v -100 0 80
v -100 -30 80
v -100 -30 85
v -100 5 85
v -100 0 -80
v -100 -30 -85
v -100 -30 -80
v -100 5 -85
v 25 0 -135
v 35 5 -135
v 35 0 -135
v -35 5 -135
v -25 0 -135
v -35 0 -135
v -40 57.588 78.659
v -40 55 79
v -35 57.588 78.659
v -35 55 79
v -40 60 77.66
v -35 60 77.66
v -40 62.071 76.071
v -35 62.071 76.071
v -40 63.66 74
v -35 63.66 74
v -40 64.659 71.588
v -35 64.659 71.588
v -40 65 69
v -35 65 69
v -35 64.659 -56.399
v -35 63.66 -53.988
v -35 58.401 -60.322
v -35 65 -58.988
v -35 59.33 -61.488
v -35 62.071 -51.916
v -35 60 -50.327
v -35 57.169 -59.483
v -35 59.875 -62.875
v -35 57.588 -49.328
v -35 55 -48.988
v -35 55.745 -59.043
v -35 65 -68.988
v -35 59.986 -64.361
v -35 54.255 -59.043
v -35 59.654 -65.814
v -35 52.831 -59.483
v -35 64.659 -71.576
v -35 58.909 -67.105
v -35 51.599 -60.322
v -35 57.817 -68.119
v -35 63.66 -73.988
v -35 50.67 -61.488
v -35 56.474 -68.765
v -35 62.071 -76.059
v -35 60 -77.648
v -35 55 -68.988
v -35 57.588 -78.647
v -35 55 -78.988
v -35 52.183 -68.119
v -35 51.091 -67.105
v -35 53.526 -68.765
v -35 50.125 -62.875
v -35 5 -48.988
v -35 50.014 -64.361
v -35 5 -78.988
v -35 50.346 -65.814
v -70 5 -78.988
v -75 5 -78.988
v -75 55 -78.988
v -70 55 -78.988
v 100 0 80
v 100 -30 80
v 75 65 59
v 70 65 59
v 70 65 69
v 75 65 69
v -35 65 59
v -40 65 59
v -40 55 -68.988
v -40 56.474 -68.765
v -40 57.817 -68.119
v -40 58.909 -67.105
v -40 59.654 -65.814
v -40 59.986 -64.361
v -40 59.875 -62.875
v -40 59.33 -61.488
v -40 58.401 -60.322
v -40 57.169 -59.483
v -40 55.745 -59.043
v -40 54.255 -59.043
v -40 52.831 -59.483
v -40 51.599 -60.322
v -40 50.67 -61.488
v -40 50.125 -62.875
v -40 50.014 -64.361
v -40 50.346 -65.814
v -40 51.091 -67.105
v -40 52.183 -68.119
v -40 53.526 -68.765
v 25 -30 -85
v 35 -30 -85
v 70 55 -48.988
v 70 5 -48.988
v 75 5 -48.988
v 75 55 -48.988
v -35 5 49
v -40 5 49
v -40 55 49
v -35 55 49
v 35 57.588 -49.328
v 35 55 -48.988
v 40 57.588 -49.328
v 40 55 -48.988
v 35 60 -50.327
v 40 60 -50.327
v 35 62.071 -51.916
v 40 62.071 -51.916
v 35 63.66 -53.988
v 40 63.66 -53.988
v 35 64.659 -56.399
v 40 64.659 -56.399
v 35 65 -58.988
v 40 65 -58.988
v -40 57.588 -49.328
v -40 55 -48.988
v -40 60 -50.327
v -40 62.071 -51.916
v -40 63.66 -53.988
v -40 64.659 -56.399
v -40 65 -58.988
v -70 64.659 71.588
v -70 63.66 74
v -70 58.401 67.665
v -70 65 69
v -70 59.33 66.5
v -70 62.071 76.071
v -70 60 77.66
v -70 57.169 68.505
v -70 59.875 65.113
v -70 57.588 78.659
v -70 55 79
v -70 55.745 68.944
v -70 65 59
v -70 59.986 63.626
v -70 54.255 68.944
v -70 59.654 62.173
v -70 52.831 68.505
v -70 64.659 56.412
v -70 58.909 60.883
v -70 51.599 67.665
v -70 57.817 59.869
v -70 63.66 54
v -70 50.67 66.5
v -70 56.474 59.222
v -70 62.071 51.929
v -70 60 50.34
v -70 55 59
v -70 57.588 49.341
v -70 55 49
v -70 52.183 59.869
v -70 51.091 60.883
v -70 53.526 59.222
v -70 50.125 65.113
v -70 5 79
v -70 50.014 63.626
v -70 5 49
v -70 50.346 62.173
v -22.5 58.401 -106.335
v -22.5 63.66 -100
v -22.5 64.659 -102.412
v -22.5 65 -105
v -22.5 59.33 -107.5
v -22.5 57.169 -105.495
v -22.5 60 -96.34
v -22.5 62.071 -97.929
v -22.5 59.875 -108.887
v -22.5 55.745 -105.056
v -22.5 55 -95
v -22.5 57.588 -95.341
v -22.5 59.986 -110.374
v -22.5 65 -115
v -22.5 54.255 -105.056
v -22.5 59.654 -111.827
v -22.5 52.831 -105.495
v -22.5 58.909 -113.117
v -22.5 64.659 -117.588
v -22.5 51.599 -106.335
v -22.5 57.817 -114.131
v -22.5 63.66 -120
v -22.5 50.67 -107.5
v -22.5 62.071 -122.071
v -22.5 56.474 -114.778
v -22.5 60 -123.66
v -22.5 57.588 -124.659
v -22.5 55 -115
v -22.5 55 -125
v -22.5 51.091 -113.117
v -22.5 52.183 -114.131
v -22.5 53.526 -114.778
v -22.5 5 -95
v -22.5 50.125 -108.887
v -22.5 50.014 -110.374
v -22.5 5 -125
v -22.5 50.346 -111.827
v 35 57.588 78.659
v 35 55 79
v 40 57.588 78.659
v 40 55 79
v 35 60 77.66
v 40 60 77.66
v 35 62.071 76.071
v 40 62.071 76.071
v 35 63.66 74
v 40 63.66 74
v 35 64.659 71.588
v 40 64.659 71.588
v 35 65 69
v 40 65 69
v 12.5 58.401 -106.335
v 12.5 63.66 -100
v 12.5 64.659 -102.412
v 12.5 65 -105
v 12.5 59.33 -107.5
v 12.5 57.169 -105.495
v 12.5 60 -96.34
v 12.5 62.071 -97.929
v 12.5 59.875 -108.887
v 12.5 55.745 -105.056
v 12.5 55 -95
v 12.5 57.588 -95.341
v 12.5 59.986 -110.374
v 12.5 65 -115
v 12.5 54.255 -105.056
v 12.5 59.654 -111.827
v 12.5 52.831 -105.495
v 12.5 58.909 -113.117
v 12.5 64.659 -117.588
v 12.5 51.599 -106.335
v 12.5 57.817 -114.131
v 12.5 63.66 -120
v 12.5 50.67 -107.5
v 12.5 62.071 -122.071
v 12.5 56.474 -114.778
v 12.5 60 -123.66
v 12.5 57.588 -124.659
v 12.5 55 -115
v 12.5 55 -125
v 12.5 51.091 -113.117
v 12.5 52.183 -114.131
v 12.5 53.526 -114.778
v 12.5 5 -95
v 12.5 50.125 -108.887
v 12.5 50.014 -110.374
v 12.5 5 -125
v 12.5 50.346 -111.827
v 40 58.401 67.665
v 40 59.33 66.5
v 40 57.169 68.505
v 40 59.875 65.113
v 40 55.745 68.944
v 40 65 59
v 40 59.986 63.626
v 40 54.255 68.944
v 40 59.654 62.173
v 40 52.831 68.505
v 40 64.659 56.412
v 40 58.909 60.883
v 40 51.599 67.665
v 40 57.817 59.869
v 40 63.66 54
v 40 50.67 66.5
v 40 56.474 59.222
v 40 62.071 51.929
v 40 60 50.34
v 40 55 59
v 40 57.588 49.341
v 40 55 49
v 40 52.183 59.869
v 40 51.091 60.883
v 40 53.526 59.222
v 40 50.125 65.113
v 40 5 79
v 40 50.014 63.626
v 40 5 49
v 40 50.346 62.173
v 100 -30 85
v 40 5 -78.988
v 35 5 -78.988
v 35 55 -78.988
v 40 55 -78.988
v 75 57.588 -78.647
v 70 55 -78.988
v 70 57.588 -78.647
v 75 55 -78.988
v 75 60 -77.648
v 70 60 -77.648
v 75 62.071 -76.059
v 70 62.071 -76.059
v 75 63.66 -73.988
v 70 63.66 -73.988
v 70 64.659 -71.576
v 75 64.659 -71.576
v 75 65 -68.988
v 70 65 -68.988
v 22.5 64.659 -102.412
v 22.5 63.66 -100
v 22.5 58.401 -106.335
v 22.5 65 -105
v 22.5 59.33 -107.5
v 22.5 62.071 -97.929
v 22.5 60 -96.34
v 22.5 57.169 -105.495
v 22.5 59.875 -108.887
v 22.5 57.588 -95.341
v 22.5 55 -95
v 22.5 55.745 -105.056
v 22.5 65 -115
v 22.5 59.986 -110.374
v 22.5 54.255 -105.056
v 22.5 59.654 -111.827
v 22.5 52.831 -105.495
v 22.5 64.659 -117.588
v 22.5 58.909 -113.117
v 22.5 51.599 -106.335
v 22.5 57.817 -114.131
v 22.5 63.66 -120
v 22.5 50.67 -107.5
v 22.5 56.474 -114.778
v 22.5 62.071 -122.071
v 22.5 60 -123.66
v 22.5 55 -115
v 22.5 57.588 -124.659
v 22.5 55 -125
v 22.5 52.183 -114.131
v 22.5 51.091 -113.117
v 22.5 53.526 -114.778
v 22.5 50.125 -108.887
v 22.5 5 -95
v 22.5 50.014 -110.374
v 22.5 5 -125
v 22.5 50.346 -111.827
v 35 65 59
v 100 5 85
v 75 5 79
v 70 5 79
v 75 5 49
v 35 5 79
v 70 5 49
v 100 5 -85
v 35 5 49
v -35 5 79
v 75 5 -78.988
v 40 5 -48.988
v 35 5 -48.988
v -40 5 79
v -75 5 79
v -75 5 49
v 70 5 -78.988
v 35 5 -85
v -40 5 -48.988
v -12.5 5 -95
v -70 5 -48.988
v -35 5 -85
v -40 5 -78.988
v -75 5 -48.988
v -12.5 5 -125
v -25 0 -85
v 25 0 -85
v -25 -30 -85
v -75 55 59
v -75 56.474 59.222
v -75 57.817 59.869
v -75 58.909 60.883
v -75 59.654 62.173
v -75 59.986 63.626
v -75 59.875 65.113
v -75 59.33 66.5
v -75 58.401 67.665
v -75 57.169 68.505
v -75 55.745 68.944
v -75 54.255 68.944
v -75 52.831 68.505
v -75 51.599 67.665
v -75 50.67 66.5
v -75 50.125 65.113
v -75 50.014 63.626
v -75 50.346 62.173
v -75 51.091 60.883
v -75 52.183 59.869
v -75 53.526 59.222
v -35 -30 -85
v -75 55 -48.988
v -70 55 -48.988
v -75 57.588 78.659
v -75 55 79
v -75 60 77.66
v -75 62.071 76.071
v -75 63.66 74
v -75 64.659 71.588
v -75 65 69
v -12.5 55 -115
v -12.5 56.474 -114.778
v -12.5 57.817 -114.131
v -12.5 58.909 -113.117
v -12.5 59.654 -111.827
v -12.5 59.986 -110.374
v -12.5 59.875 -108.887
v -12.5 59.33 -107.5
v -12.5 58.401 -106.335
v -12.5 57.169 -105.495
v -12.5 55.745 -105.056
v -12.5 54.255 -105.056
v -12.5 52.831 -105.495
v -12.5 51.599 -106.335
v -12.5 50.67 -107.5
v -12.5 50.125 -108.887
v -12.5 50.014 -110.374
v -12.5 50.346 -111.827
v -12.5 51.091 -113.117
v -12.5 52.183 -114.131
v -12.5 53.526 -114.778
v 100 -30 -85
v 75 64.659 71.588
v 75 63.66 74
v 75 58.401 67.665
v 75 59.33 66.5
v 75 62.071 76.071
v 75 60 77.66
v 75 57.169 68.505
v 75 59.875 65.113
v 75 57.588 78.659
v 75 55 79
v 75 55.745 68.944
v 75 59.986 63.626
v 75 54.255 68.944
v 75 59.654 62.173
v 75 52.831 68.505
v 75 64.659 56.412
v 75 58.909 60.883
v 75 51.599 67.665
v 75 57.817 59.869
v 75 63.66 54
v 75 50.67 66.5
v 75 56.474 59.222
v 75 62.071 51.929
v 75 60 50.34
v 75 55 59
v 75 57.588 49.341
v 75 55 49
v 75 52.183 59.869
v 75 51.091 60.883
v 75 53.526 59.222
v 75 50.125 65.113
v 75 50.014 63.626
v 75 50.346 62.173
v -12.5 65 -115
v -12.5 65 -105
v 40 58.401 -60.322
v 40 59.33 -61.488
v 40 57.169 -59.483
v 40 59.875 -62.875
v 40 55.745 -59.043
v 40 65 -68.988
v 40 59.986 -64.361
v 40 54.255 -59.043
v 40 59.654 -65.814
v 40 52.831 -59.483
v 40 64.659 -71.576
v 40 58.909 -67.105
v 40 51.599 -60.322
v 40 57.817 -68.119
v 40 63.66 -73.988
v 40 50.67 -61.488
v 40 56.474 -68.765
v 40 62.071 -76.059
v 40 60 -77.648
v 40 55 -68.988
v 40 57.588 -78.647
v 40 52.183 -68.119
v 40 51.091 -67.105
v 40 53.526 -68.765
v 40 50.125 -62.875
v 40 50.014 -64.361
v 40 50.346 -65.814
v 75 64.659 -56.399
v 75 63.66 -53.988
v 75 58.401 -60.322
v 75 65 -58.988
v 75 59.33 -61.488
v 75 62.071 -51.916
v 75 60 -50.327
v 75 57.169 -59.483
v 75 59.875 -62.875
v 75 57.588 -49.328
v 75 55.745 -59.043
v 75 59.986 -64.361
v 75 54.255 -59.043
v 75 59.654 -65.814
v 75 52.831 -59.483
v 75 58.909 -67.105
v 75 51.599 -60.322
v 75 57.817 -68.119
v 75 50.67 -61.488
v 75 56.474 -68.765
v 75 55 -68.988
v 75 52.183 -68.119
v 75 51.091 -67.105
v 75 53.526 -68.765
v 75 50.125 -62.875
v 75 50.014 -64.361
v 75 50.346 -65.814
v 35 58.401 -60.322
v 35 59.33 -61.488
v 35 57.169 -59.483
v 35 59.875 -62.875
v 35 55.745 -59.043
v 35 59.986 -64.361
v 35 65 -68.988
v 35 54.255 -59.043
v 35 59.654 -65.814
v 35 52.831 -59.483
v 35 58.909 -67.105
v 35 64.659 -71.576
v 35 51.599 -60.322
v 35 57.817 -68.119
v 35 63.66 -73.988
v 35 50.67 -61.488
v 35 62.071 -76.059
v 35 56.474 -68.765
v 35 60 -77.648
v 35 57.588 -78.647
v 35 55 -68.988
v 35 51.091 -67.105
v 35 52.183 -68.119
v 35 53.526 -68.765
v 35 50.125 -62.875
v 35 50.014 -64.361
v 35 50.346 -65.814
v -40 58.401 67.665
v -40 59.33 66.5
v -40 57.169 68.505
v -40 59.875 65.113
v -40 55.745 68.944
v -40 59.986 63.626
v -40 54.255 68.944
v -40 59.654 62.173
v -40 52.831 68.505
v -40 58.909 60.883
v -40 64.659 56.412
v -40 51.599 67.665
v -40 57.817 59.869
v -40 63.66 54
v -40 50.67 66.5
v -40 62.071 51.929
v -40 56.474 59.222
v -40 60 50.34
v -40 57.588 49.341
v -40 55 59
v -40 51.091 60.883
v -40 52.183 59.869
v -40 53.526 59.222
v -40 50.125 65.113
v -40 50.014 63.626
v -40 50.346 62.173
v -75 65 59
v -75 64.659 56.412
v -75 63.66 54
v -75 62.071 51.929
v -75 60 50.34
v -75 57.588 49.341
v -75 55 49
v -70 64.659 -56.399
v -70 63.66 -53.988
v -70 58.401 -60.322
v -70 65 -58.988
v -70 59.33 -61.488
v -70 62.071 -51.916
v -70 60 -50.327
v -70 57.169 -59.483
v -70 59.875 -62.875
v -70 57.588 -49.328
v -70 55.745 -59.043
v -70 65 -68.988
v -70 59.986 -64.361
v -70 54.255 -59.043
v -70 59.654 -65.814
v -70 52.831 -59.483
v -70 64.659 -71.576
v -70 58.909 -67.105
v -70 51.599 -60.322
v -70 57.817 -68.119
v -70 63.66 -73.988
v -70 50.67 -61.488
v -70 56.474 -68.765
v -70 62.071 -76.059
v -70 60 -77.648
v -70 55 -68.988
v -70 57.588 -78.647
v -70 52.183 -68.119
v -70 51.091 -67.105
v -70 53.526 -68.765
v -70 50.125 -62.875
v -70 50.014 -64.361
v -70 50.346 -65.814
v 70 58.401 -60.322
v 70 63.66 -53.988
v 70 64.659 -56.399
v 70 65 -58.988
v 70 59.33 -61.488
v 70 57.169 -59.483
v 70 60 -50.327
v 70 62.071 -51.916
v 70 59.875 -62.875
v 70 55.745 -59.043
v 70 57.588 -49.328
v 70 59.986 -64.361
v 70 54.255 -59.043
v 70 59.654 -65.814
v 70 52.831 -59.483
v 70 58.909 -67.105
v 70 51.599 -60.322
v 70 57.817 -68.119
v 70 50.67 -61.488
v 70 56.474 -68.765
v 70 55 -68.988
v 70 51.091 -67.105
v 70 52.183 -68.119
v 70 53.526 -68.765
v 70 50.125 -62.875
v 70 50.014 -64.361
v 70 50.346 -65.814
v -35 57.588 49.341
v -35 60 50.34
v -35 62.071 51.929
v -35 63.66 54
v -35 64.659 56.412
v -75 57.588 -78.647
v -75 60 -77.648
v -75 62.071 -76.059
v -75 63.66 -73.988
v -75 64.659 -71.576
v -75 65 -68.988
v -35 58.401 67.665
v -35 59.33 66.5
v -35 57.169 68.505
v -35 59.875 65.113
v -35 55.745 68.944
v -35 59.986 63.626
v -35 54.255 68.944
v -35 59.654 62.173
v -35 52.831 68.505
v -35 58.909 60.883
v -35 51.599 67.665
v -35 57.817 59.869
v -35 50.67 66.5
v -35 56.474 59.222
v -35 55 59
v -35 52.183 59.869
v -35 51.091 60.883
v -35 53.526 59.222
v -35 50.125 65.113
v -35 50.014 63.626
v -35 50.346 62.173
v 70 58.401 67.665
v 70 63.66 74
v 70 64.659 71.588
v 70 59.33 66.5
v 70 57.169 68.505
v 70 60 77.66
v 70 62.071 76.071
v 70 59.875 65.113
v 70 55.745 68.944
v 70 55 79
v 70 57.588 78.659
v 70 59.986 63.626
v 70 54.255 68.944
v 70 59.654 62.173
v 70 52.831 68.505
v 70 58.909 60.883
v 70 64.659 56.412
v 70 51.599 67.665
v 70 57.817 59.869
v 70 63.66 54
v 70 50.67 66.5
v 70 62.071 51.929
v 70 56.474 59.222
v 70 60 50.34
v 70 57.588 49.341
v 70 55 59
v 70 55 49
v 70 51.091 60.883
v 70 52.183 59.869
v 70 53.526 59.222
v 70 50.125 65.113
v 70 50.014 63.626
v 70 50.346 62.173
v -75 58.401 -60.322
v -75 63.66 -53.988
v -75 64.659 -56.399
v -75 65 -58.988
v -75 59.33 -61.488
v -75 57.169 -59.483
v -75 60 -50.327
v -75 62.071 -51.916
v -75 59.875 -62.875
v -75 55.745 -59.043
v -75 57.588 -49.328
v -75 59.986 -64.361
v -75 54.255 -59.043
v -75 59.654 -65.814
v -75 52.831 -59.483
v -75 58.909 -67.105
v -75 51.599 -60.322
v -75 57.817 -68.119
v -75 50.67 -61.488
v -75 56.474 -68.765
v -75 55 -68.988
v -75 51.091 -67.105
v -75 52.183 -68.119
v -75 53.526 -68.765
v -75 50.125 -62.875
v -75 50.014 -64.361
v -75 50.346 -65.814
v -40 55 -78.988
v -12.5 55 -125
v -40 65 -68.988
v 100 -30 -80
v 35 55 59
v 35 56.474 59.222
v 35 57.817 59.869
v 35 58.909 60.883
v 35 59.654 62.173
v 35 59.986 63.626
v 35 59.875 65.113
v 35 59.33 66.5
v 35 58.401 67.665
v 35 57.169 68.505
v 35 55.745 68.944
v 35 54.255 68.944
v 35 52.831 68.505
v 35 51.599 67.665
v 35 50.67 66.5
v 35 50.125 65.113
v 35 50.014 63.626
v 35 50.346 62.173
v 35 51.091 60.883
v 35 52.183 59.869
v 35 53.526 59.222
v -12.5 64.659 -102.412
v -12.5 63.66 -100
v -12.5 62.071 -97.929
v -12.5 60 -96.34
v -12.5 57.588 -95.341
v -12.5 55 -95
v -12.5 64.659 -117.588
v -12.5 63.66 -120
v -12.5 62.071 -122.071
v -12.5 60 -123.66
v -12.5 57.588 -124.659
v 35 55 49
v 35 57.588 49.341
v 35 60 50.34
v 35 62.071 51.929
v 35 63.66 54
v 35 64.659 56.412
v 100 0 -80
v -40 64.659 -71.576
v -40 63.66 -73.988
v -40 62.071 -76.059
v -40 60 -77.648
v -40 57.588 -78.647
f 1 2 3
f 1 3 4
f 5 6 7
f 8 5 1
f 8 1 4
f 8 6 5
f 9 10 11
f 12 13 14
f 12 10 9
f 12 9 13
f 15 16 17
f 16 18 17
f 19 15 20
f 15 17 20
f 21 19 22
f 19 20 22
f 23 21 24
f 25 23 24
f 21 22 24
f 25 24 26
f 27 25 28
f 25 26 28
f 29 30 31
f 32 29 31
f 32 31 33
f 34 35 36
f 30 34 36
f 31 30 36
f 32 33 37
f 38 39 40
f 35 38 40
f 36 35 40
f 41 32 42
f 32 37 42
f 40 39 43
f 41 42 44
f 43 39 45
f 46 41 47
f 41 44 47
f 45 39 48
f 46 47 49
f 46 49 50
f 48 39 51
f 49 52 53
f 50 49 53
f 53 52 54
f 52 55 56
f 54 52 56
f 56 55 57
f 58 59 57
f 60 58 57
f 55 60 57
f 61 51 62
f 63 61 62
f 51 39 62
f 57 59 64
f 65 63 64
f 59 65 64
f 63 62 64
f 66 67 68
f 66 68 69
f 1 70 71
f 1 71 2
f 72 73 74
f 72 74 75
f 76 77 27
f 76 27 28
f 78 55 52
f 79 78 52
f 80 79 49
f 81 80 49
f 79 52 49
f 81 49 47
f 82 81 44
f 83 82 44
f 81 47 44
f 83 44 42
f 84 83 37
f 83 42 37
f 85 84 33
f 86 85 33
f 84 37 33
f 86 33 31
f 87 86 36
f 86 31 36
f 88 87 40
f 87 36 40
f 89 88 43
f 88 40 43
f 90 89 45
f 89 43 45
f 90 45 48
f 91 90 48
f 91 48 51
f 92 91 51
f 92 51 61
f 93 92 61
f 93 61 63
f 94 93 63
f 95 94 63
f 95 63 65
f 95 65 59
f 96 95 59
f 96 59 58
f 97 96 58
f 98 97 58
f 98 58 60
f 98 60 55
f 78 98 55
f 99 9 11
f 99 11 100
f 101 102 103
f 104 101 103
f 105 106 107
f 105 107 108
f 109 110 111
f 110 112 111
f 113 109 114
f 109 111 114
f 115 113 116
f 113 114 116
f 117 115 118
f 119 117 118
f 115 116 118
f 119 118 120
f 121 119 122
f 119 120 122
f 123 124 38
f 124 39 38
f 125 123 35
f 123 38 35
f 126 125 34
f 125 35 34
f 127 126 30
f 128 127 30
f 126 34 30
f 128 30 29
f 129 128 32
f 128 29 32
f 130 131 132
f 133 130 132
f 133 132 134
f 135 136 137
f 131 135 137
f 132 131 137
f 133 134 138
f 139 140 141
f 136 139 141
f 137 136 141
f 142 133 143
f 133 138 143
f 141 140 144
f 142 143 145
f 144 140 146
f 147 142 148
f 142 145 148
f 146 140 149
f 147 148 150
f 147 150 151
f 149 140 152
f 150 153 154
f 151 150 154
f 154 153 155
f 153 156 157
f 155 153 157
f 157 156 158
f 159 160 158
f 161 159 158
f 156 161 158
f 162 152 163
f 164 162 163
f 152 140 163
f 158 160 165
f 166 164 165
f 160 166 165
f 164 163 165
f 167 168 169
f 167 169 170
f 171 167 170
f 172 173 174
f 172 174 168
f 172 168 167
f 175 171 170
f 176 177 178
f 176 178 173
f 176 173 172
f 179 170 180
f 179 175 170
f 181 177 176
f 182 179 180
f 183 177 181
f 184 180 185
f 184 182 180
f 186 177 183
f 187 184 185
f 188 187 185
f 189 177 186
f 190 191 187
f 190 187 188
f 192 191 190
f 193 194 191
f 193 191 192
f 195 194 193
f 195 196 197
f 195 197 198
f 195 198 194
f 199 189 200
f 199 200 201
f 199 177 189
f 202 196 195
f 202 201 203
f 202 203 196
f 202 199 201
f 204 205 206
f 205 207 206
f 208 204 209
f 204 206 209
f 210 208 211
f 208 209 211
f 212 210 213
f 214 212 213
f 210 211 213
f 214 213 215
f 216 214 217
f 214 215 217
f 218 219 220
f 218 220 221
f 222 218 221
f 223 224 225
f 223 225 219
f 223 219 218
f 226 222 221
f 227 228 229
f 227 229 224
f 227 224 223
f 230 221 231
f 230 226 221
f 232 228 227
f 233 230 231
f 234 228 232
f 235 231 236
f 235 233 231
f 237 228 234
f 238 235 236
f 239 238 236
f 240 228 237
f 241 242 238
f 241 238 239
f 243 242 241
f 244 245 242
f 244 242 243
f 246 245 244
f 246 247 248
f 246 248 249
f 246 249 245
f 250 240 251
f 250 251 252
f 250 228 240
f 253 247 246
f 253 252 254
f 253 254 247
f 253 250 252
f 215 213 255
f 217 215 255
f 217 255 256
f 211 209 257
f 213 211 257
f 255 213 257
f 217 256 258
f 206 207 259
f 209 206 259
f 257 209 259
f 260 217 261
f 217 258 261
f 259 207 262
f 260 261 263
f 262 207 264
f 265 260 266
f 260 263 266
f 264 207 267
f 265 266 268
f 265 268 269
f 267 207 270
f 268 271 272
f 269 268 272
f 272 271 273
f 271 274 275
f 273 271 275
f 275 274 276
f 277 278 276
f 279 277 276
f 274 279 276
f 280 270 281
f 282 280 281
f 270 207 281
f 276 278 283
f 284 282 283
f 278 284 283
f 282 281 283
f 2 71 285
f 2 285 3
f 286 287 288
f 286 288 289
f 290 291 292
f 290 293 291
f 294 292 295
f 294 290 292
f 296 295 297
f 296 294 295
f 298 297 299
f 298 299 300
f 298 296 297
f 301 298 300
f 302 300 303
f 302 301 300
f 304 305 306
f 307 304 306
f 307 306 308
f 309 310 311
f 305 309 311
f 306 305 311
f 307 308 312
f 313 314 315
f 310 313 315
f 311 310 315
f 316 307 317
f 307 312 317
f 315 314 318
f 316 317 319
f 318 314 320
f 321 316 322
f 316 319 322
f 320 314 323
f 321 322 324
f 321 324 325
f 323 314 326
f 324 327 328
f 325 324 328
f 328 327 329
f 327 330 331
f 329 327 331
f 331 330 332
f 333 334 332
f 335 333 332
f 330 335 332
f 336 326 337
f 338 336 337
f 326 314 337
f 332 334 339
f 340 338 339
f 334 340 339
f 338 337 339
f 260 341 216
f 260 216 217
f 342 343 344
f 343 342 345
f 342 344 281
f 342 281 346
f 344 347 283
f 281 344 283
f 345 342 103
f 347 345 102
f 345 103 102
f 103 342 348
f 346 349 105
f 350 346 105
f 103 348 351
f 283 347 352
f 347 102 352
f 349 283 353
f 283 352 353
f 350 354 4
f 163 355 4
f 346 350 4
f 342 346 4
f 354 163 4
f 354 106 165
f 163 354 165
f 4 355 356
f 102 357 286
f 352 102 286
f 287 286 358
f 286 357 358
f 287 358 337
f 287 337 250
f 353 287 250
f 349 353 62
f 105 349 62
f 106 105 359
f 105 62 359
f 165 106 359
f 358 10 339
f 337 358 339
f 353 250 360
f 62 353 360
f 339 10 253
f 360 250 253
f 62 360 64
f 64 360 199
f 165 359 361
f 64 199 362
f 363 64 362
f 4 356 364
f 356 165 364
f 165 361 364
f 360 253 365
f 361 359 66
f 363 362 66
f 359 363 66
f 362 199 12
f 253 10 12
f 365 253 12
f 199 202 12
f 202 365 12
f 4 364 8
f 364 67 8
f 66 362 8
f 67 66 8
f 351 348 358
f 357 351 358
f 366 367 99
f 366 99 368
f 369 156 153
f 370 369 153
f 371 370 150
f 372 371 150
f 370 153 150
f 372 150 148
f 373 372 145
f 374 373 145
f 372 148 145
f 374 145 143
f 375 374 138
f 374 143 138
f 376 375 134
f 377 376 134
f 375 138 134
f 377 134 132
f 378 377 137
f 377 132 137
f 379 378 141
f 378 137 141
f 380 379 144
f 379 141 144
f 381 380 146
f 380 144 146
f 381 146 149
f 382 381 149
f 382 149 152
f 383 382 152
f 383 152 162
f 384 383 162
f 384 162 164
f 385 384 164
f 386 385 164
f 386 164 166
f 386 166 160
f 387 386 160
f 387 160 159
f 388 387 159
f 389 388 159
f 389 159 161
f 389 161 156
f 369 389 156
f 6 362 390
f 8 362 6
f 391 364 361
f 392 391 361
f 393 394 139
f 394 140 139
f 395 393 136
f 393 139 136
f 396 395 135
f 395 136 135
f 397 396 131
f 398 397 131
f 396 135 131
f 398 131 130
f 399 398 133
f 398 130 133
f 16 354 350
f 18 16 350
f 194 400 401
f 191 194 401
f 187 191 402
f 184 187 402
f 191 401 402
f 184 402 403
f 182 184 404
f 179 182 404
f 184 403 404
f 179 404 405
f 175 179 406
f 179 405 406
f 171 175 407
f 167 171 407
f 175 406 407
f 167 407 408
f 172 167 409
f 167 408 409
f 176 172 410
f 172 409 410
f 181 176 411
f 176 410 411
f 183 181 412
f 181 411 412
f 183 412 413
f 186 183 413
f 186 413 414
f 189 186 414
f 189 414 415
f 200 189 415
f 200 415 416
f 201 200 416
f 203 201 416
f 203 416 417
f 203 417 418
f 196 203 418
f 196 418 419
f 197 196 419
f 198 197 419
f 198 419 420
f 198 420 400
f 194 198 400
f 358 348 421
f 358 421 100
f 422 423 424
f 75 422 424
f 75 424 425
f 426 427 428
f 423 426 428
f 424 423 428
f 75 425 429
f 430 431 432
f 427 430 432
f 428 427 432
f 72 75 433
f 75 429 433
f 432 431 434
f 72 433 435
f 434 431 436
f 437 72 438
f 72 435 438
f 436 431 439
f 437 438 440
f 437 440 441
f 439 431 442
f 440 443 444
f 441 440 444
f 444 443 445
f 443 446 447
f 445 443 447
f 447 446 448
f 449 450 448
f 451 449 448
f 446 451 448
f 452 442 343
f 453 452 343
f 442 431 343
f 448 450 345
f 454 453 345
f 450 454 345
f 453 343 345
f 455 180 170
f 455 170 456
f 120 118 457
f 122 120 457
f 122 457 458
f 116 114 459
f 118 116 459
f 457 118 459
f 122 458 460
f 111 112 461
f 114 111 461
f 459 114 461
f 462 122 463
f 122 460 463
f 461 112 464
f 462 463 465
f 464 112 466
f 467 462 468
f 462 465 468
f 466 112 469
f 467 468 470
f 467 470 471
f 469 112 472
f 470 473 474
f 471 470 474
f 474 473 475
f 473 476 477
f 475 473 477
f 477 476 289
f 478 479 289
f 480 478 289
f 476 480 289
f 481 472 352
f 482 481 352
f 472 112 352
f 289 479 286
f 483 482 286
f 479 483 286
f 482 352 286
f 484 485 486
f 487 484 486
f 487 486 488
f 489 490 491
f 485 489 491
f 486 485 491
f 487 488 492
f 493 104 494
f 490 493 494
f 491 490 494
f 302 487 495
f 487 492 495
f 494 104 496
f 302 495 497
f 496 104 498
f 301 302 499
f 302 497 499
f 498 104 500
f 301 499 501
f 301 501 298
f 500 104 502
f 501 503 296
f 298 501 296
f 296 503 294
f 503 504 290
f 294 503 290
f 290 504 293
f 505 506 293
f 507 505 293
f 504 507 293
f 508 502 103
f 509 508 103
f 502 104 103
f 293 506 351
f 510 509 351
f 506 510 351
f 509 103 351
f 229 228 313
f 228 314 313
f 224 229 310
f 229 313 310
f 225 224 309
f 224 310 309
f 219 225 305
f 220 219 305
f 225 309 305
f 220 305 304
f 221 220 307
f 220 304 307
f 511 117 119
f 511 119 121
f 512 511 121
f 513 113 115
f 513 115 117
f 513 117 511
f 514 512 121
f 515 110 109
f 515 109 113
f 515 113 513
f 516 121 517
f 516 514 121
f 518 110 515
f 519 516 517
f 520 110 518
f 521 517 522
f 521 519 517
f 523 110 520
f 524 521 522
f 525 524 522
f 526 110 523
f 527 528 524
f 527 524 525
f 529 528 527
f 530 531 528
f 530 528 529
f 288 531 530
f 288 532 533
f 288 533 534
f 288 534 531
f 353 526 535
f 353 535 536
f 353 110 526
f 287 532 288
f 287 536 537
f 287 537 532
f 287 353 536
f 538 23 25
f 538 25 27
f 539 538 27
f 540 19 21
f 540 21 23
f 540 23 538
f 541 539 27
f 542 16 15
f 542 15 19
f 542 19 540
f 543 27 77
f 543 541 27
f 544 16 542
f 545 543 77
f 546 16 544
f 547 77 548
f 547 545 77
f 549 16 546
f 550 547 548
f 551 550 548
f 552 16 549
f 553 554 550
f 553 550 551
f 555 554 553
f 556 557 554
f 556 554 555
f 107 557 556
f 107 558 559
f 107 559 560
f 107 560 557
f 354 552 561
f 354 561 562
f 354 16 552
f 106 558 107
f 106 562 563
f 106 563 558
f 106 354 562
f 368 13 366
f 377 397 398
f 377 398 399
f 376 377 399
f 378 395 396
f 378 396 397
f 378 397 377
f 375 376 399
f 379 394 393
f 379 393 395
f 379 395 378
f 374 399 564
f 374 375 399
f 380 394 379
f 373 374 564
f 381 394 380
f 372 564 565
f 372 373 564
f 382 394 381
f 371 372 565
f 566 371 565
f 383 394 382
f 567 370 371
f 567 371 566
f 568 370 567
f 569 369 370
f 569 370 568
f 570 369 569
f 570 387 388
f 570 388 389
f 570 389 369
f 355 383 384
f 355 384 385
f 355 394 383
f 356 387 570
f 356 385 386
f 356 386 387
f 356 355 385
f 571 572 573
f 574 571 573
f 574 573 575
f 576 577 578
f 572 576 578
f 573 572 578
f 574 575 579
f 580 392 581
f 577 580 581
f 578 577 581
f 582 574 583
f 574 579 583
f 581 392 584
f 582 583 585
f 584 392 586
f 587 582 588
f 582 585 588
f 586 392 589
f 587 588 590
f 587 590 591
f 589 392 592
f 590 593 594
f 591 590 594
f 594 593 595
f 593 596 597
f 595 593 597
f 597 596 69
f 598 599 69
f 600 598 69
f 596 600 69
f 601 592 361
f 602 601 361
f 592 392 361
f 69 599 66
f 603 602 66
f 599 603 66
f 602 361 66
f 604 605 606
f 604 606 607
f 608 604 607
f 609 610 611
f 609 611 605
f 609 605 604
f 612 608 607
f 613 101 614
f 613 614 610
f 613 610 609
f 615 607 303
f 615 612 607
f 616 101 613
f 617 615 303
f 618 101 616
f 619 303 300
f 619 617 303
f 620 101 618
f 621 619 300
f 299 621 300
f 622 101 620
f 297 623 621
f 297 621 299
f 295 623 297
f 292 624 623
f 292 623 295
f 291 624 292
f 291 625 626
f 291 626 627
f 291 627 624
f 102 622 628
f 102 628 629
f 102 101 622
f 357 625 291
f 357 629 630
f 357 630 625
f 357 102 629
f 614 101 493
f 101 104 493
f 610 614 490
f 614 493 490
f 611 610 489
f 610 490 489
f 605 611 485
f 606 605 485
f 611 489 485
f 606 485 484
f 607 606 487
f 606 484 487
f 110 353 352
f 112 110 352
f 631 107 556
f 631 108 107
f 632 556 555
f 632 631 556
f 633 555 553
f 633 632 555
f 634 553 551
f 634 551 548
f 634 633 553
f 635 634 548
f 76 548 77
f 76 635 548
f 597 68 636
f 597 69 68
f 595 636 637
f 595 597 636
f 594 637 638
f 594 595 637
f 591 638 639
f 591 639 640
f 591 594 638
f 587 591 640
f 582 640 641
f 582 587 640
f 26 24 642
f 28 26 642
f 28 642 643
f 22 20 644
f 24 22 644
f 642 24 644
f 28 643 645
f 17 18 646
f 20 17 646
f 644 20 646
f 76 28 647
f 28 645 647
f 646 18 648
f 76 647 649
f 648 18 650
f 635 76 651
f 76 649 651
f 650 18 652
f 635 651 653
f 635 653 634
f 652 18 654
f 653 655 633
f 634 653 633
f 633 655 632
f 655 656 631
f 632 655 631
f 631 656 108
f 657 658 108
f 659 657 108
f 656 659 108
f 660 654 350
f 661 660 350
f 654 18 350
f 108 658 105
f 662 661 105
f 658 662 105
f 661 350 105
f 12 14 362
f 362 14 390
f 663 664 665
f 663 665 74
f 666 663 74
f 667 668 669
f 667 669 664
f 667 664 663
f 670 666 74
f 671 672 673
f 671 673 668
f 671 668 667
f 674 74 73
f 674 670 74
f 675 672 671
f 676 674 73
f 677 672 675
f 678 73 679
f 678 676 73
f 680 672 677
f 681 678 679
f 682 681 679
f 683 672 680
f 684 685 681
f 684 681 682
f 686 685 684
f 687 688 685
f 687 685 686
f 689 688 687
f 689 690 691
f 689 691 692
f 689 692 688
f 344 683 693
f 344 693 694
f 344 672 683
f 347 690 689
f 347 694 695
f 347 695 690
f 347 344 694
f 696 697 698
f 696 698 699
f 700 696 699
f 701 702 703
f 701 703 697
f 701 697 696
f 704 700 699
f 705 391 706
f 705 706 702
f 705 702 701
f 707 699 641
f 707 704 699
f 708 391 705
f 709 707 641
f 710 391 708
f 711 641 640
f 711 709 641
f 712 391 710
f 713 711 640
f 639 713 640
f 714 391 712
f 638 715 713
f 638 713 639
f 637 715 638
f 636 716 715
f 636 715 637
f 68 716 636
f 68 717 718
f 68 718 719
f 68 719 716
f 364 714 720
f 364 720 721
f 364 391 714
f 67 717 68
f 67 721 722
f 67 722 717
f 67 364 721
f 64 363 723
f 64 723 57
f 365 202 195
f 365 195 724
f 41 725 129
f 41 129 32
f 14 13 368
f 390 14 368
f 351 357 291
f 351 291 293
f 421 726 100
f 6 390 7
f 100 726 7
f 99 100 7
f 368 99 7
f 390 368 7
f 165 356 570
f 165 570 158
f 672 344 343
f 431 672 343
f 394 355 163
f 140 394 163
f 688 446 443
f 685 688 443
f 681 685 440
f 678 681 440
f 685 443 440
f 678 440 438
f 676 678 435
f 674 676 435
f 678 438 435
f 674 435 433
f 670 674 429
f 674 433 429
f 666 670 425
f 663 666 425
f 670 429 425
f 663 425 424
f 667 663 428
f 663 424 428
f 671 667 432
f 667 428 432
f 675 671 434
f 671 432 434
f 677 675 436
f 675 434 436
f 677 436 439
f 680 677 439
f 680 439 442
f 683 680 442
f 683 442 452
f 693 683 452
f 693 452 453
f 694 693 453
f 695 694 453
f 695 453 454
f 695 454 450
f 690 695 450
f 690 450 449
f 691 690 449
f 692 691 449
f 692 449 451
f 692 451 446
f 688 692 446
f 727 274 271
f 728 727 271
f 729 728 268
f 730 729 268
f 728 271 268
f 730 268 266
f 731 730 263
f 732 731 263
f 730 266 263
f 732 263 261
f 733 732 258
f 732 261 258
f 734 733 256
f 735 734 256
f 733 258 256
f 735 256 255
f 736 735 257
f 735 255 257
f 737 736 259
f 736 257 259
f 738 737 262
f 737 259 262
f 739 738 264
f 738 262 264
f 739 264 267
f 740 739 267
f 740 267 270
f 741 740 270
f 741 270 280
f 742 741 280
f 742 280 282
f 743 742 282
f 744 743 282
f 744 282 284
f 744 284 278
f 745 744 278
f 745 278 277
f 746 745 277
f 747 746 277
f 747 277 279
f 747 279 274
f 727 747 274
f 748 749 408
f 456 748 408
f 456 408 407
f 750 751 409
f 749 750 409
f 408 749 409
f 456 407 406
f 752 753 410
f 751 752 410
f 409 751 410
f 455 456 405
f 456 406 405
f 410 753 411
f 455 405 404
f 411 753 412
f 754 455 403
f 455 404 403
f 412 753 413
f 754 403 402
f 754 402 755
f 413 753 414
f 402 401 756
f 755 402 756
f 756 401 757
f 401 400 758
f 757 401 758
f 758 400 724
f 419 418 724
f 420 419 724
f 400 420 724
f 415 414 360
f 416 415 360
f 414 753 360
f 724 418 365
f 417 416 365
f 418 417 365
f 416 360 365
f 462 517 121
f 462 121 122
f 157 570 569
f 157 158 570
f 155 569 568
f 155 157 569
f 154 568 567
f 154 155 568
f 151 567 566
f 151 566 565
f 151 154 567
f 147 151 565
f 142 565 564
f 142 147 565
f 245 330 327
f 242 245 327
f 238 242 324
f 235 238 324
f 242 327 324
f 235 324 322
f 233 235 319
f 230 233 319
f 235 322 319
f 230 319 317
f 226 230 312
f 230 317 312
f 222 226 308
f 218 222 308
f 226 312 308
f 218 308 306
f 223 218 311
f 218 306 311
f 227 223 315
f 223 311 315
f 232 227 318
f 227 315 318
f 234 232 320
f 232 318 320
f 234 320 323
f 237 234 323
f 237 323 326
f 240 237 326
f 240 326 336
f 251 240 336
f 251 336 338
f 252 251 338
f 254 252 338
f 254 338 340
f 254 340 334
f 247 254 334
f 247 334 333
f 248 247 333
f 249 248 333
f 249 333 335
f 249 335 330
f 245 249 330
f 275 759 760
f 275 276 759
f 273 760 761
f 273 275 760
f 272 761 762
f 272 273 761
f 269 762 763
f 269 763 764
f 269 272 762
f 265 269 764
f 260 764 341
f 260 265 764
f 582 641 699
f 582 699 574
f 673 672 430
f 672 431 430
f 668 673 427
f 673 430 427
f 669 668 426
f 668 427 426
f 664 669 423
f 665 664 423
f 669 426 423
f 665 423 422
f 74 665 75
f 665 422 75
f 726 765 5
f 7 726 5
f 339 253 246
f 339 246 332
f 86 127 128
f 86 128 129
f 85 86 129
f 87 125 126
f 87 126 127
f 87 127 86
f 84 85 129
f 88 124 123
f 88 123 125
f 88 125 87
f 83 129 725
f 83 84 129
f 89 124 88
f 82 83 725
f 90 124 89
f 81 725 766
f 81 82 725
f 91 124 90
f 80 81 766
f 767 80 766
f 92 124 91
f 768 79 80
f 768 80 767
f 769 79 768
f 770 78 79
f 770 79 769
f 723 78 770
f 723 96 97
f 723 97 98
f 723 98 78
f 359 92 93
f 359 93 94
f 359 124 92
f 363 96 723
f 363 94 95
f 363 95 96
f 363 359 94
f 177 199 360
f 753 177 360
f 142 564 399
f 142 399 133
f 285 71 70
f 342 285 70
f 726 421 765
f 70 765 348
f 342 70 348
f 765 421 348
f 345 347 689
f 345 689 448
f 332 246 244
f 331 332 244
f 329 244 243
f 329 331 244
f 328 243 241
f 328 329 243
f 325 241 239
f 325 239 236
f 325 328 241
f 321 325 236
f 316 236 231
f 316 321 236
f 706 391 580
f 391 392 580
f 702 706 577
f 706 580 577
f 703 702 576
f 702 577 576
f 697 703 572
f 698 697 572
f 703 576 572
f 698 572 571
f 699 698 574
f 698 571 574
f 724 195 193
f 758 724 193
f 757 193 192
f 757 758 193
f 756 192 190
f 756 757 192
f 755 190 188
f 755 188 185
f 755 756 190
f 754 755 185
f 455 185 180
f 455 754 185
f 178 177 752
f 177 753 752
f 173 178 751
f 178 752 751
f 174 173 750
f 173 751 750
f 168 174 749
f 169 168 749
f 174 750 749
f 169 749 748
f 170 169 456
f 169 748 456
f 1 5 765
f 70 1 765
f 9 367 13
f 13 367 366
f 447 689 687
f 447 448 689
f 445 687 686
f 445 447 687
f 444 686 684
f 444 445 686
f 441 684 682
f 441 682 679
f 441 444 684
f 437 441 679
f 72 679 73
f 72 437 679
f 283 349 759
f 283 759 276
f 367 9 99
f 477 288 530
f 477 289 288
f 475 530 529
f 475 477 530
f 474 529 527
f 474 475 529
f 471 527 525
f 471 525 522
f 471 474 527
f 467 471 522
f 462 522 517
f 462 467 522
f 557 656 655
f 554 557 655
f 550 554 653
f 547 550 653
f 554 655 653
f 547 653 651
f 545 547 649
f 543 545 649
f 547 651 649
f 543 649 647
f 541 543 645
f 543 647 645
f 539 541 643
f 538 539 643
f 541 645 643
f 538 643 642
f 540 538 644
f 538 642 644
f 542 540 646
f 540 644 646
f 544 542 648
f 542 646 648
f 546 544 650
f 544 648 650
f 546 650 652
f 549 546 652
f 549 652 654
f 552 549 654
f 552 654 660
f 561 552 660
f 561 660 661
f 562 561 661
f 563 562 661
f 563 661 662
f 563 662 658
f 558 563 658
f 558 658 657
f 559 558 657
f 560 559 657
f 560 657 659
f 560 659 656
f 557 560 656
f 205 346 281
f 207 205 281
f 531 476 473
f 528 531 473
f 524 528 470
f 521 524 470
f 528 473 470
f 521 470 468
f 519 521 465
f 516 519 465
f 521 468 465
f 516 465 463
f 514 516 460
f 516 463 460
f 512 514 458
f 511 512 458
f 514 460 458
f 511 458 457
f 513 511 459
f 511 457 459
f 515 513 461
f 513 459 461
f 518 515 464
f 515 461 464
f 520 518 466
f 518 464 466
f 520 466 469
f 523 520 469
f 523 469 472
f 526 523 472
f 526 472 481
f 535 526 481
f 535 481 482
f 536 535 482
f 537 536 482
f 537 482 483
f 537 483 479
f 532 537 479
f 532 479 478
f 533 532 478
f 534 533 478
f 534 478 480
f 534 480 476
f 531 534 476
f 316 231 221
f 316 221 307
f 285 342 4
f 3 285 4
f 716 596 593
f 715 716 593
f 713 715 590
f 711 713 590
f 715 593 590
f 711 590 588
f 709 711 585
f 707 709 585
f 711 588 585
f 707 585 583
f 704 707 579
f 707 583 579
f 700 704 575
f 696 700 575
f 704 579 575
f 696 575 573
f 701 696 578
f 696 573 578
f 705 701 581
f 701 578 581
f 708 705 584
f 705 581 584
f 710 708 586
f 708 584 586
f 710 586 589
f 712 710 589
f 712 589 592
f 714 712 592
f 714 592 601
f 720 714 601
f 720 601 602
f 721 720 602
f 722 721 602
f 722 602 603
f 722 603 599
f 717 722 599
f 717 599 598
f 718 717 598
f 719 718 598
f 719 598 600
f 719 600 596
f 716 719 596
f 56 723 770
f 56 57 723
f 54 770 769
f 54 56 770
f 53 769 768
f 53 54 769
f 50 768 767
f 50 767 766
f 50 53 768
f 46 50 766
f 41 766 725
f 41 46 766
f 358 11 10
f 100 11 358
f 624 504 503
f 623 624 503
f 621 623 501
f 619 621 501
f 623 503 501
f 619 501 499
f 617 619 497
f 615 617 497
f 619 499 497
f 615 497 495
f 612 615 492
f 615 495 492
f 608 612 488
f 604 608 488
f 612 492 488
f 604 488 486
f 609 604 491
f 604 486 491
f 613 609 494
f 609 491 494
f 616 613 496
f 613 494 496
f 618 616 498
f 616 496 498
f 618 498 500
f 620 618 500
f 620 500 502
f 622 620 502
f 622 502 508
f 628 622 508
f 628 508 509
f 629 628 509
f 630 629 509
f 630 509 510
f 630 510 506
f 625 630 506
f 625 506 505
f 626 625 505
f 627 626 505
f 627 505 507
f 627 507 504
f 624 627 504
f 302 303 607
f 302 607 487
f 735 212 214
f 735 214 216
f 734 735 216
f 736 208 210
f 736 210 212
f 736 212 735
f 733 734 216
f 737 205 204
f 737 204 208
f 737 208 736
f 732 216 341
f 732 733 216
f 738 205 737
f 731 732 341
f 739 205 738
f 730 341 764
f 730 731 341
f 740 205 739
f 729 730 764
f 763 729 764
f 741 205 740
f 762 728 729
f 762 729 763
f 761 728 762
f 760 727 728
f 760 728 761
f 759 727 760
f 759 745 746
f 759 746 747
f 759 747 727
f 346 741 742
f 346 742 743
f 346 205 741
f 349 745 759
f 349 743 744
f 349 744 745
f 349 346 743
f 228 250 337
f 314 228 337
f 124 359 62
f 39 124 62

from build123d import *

# Parameters (mm, degrees)
SKETCH2_W              = 200
SKETCH2_H              = 160
BOSS_EXTRUDE1_DEPTH    = 5
SKETCH3_W              = 5
SKETCH3_H              = 30
BOSS_EXTRUDE2_DEPTH    = 60
CUT_EXTRUDE1_REACH     = 171.853
SKETCH4_R              = 5
FILLET1_R              = 10
LPATTERN1_COUNT        = 2
LPATTERN1_PITCH        = 110
LPATTERN1_COUNT_DIR2   = 2
LPATTERN1_PITCH_DIR2   = 127.98756405
FILLET1_OF_LPATTERN1_R = 10
SKETCH6_W              = 200
SKETCH6_H              = 35
BOSS_EXTRUDE3_DEPTH    = 5
SKETCH7_W              = 70
SKETCH7_H              = 5
BOSS_EXTRUDE8_DEPTH    = 50
SKETCH9_W              = 10
SKETCH9_H              = 30
BOSS_EXTRUDE9_DEPTH    = 60
FILLET2_R              = 10
CUT_EXTRUDE2_REACH     = 195.536
SKETCH11_R             = 5
RIB4_REACH             = 203.68
SKETCH14_WALL_W        = 463.67039955
SKETCH14_WALL_H        = 10


with BuildPart() as part:
    # Sketch2 → Boss-Extrude1 (new body)
    with BuildSketch(Plane(origin=(0, 0, 0), x_dir=(1, 0, 0), z_dir=(0, 1, 0))):
        Rectangle(SKETCH2_W, SKETCH2_H)
    extrude(amount=BOSS_EXTRUDE1_DEPTH)

    # Sketch3 → Boss-Extrude2 (add)
    with BuildSketch(Plane(origin=(0, 5, 0), x_dir=(1, 0, 0), z_dir=(0, 1, 0))):
        with Locations((-72.5, 63.98756405)):
            Rectangle(SKETCH3_W, SKETCH3_H)
        with Locations((-37.5, 63.98756405)):
            Rectangle(SKETCH3_W, SKETCH3_H)
    boss_extrude2 = extrude(amount=BOSS_EXTRUDE2_DEPTH)

    # Cut-Extrude1: up to this face of the body (flat: up to its plane)
    cut_extrude1_end = Plane(part.part.faces().sort_by_distance((-75, 35, -63.98756405))[0])
    # Sketch4 → Cut-Extrude1 (cut, up to the picked face)
    with BuildSketch(Plane(origin=(-35, 0, 0), x_dir=(0, 0, -1), z_dir=(1, 0, 0)), mode=Mode.PRIVATE) as cut_extrude1_sk1:
        with Locations((63.98756405, 55)):
            Circle(SKETCH4_R)
    cut_extrude1_tool1 = split(extrude(cut_extrude1_sk1.sketch, amount=-CUT_EXTRUDE1_REACH, mode=Mode.PRIVATE), bisect_by=cut_extrude1_end, keep=Keep.BOTH, mode=Mode.PRIVATE)
    cut_extrude1 = cut_extrude1_tool1.solids().sort_by(Axis((-35, 55, -63.987564), (-1, 0, 0)))[0]
    add(cut_extrude1, mode=Mode.SUBTRACT)

    # Fillet1
    fillet1_edges = [part.edges().sort_by_distance(p)[0] for p in [
        (-72.5, 65, -78.98756405),
        (-72.5, 65, -48.98756405),
        (-37.5, 65, -78.98756405),
        (-37.5, 65, -48.98756405),
    ]]
    fillet(fillet1_edges, radius=FILLET1_R)

    # LPattern1: Boss-Extrude2, Cut-Extrude1 2 × 2
    with Locations(*[(i * LPATTERN1_PITCH, 0, j * LPATTERN1_PITCH_DIR2) for i in range(LPATTERN1_COUNT) for j in range(LPATTERN1_COUNT_DIR2) if (i, j) != (0, 0)]):
        add(boss_extrude2)
        add(cut_extrude1, mode=Mode.SUBTRACT)

    # Fillet1 of LPattern1
    fillet1_of_lpattern1_edges = [part.edges().sort_by_distance(p)[0] for p in [
        (-72.5, 65, 49),
        (-72.5, 65, 79),
        (-37.5, 65, 49),
        (-37.5, 65, 79),
        (37.5, 65, -78.98756405),
        (37.5, 65, -48.98756405),
        (72.5, 65, -78.98756405),
        (72.5, 65, -48.98756405),
        (37.5, 65, 49),
        (37.5, 65, 79),
        (72.5, 65, 49),
        (72.5, 65, 79),
    ]]
    fillet(fillet1_of_lpattern1_edges, radius=FILLET1_OF_LPATTERN1_R)

    # Sketch6 → Boss-Extrude3 (add)
    with BuildSketch(Plane(origin=(0, 0, -80), x_dir=(-1, 0, 0), z_dir=(0, 0, -1))):
        with Locations((0, -12.5)):
            Rectangle(SKETCH6_W, SKETCH6_H)
    boss_extrude3 = extrude(amount=BOSS_EXTRUDE3_DEPTH)

    # Mirror8: Boss-Extrude3 across plane
    add(boss_extrude3.mirror(Plane.XY))

    # Sketch7 → Boss-Extrude8 (add)
    with BuildSketch(Plane(origin=(0, 0, -85), x_dir=(-1, 0, 0), z_dir=(0, 0, -1))):
        with Locations((0, 2.5)):
            Rectangle(SKETCH7_W, SKETCH7_H)
    extrude(amount=BOSS_EXTRUDE8_DEPTH)

    # Sketch9 → Boss-Extrude9 (add)
    with BuildSketch(Plane(origin=(0, 5, 0), x_dir=(1, 0, 0), z_dir=(0, 1, 0))):
        with Locations((-17.5, 110)):
            Rectangle(SKETCH9_W, SKETCH9_H)
        with Locations((17.5, 110)):
            Rectangle(SKETCH9_W, SKETCH9_H)
    extrude(amount=BOSS_EXTRUDE9_DEPTH)

    # Fillet2
    fillet2_edges = [part.edges().sort_by_distance(p)[0] for p in [
        (-17.5, 65, -95),
        (-17.5, 65, -125),
        (17.5, 65, -95),
        (17.5, 65, -125),
    ]]
    fillet(fillet2_edges, radius=FILLET2_R)

    # Cut-Extrude2: up to this face of the body (flat: up to its plane)
    cut_extrude2_end = Plane(part.part.faces().sort_by_distance((-22.5, 34.321749192, -110))[0])
    # Sketch11 → Cut-Extrude2 (cut, up to the picked face)
    with BuildSketch(Plane(origin=(22.5, 0, 0), x_dir=(0, 0, -1), z_dir=(1, 0, 0)), mode=Mode.PRIVATE) as cut_extrude2_sk1:
        with Locations((110, 55)):
            Circle(SKETCH11_R)
    cut_extrude2_tool1 = split(extrude(cut_extrude2_sk1.sketch, amount=-CUT_EXTRUDE2_REACH, mode=Mode.PRIVATE), bisect_by=cut_extrude2_end, keep=Keep.BOTH, mode=Mode.PRIVATE)
    add(cut_extrude2_tool1.solids().sort_by(Axis((22.5, 55, -110), (-1, 0, 0)))[0], mode=Mode.SUBTRACT)

    # Sketch14 wall → Rib4 (add, up to next)
    with BuildSketch(Plane(origin=(35, -15, -110), x_dir=(0, -0.514495755428, 0.857492925713), z_dir=(0, -0.857492925713, -0.514495755428)), mode=Mode.PRIVATE) as rib4_sk1:
        with Locations((0, 5)):
            Rectangle(SKETCH14_WALL_W, SKETCH14_WALL_H)
    rib4_tool1 = extrude(rib4_sk1.sketch, amount=-RIB4_REACH, mode=Mode.PRIVATE) - part.part
    rib4 = rib4_tool1.solids().sort_by_distance((35, -15, -110))[0]
    add(rib4)

    # Mirror1: Rib4 across plane
    add(rib4.mirror(Plane(origin=(0, 0, 0), x_dir=(0, 0, 1), z_dir=(1, 0, 0))))


solid = part.part
